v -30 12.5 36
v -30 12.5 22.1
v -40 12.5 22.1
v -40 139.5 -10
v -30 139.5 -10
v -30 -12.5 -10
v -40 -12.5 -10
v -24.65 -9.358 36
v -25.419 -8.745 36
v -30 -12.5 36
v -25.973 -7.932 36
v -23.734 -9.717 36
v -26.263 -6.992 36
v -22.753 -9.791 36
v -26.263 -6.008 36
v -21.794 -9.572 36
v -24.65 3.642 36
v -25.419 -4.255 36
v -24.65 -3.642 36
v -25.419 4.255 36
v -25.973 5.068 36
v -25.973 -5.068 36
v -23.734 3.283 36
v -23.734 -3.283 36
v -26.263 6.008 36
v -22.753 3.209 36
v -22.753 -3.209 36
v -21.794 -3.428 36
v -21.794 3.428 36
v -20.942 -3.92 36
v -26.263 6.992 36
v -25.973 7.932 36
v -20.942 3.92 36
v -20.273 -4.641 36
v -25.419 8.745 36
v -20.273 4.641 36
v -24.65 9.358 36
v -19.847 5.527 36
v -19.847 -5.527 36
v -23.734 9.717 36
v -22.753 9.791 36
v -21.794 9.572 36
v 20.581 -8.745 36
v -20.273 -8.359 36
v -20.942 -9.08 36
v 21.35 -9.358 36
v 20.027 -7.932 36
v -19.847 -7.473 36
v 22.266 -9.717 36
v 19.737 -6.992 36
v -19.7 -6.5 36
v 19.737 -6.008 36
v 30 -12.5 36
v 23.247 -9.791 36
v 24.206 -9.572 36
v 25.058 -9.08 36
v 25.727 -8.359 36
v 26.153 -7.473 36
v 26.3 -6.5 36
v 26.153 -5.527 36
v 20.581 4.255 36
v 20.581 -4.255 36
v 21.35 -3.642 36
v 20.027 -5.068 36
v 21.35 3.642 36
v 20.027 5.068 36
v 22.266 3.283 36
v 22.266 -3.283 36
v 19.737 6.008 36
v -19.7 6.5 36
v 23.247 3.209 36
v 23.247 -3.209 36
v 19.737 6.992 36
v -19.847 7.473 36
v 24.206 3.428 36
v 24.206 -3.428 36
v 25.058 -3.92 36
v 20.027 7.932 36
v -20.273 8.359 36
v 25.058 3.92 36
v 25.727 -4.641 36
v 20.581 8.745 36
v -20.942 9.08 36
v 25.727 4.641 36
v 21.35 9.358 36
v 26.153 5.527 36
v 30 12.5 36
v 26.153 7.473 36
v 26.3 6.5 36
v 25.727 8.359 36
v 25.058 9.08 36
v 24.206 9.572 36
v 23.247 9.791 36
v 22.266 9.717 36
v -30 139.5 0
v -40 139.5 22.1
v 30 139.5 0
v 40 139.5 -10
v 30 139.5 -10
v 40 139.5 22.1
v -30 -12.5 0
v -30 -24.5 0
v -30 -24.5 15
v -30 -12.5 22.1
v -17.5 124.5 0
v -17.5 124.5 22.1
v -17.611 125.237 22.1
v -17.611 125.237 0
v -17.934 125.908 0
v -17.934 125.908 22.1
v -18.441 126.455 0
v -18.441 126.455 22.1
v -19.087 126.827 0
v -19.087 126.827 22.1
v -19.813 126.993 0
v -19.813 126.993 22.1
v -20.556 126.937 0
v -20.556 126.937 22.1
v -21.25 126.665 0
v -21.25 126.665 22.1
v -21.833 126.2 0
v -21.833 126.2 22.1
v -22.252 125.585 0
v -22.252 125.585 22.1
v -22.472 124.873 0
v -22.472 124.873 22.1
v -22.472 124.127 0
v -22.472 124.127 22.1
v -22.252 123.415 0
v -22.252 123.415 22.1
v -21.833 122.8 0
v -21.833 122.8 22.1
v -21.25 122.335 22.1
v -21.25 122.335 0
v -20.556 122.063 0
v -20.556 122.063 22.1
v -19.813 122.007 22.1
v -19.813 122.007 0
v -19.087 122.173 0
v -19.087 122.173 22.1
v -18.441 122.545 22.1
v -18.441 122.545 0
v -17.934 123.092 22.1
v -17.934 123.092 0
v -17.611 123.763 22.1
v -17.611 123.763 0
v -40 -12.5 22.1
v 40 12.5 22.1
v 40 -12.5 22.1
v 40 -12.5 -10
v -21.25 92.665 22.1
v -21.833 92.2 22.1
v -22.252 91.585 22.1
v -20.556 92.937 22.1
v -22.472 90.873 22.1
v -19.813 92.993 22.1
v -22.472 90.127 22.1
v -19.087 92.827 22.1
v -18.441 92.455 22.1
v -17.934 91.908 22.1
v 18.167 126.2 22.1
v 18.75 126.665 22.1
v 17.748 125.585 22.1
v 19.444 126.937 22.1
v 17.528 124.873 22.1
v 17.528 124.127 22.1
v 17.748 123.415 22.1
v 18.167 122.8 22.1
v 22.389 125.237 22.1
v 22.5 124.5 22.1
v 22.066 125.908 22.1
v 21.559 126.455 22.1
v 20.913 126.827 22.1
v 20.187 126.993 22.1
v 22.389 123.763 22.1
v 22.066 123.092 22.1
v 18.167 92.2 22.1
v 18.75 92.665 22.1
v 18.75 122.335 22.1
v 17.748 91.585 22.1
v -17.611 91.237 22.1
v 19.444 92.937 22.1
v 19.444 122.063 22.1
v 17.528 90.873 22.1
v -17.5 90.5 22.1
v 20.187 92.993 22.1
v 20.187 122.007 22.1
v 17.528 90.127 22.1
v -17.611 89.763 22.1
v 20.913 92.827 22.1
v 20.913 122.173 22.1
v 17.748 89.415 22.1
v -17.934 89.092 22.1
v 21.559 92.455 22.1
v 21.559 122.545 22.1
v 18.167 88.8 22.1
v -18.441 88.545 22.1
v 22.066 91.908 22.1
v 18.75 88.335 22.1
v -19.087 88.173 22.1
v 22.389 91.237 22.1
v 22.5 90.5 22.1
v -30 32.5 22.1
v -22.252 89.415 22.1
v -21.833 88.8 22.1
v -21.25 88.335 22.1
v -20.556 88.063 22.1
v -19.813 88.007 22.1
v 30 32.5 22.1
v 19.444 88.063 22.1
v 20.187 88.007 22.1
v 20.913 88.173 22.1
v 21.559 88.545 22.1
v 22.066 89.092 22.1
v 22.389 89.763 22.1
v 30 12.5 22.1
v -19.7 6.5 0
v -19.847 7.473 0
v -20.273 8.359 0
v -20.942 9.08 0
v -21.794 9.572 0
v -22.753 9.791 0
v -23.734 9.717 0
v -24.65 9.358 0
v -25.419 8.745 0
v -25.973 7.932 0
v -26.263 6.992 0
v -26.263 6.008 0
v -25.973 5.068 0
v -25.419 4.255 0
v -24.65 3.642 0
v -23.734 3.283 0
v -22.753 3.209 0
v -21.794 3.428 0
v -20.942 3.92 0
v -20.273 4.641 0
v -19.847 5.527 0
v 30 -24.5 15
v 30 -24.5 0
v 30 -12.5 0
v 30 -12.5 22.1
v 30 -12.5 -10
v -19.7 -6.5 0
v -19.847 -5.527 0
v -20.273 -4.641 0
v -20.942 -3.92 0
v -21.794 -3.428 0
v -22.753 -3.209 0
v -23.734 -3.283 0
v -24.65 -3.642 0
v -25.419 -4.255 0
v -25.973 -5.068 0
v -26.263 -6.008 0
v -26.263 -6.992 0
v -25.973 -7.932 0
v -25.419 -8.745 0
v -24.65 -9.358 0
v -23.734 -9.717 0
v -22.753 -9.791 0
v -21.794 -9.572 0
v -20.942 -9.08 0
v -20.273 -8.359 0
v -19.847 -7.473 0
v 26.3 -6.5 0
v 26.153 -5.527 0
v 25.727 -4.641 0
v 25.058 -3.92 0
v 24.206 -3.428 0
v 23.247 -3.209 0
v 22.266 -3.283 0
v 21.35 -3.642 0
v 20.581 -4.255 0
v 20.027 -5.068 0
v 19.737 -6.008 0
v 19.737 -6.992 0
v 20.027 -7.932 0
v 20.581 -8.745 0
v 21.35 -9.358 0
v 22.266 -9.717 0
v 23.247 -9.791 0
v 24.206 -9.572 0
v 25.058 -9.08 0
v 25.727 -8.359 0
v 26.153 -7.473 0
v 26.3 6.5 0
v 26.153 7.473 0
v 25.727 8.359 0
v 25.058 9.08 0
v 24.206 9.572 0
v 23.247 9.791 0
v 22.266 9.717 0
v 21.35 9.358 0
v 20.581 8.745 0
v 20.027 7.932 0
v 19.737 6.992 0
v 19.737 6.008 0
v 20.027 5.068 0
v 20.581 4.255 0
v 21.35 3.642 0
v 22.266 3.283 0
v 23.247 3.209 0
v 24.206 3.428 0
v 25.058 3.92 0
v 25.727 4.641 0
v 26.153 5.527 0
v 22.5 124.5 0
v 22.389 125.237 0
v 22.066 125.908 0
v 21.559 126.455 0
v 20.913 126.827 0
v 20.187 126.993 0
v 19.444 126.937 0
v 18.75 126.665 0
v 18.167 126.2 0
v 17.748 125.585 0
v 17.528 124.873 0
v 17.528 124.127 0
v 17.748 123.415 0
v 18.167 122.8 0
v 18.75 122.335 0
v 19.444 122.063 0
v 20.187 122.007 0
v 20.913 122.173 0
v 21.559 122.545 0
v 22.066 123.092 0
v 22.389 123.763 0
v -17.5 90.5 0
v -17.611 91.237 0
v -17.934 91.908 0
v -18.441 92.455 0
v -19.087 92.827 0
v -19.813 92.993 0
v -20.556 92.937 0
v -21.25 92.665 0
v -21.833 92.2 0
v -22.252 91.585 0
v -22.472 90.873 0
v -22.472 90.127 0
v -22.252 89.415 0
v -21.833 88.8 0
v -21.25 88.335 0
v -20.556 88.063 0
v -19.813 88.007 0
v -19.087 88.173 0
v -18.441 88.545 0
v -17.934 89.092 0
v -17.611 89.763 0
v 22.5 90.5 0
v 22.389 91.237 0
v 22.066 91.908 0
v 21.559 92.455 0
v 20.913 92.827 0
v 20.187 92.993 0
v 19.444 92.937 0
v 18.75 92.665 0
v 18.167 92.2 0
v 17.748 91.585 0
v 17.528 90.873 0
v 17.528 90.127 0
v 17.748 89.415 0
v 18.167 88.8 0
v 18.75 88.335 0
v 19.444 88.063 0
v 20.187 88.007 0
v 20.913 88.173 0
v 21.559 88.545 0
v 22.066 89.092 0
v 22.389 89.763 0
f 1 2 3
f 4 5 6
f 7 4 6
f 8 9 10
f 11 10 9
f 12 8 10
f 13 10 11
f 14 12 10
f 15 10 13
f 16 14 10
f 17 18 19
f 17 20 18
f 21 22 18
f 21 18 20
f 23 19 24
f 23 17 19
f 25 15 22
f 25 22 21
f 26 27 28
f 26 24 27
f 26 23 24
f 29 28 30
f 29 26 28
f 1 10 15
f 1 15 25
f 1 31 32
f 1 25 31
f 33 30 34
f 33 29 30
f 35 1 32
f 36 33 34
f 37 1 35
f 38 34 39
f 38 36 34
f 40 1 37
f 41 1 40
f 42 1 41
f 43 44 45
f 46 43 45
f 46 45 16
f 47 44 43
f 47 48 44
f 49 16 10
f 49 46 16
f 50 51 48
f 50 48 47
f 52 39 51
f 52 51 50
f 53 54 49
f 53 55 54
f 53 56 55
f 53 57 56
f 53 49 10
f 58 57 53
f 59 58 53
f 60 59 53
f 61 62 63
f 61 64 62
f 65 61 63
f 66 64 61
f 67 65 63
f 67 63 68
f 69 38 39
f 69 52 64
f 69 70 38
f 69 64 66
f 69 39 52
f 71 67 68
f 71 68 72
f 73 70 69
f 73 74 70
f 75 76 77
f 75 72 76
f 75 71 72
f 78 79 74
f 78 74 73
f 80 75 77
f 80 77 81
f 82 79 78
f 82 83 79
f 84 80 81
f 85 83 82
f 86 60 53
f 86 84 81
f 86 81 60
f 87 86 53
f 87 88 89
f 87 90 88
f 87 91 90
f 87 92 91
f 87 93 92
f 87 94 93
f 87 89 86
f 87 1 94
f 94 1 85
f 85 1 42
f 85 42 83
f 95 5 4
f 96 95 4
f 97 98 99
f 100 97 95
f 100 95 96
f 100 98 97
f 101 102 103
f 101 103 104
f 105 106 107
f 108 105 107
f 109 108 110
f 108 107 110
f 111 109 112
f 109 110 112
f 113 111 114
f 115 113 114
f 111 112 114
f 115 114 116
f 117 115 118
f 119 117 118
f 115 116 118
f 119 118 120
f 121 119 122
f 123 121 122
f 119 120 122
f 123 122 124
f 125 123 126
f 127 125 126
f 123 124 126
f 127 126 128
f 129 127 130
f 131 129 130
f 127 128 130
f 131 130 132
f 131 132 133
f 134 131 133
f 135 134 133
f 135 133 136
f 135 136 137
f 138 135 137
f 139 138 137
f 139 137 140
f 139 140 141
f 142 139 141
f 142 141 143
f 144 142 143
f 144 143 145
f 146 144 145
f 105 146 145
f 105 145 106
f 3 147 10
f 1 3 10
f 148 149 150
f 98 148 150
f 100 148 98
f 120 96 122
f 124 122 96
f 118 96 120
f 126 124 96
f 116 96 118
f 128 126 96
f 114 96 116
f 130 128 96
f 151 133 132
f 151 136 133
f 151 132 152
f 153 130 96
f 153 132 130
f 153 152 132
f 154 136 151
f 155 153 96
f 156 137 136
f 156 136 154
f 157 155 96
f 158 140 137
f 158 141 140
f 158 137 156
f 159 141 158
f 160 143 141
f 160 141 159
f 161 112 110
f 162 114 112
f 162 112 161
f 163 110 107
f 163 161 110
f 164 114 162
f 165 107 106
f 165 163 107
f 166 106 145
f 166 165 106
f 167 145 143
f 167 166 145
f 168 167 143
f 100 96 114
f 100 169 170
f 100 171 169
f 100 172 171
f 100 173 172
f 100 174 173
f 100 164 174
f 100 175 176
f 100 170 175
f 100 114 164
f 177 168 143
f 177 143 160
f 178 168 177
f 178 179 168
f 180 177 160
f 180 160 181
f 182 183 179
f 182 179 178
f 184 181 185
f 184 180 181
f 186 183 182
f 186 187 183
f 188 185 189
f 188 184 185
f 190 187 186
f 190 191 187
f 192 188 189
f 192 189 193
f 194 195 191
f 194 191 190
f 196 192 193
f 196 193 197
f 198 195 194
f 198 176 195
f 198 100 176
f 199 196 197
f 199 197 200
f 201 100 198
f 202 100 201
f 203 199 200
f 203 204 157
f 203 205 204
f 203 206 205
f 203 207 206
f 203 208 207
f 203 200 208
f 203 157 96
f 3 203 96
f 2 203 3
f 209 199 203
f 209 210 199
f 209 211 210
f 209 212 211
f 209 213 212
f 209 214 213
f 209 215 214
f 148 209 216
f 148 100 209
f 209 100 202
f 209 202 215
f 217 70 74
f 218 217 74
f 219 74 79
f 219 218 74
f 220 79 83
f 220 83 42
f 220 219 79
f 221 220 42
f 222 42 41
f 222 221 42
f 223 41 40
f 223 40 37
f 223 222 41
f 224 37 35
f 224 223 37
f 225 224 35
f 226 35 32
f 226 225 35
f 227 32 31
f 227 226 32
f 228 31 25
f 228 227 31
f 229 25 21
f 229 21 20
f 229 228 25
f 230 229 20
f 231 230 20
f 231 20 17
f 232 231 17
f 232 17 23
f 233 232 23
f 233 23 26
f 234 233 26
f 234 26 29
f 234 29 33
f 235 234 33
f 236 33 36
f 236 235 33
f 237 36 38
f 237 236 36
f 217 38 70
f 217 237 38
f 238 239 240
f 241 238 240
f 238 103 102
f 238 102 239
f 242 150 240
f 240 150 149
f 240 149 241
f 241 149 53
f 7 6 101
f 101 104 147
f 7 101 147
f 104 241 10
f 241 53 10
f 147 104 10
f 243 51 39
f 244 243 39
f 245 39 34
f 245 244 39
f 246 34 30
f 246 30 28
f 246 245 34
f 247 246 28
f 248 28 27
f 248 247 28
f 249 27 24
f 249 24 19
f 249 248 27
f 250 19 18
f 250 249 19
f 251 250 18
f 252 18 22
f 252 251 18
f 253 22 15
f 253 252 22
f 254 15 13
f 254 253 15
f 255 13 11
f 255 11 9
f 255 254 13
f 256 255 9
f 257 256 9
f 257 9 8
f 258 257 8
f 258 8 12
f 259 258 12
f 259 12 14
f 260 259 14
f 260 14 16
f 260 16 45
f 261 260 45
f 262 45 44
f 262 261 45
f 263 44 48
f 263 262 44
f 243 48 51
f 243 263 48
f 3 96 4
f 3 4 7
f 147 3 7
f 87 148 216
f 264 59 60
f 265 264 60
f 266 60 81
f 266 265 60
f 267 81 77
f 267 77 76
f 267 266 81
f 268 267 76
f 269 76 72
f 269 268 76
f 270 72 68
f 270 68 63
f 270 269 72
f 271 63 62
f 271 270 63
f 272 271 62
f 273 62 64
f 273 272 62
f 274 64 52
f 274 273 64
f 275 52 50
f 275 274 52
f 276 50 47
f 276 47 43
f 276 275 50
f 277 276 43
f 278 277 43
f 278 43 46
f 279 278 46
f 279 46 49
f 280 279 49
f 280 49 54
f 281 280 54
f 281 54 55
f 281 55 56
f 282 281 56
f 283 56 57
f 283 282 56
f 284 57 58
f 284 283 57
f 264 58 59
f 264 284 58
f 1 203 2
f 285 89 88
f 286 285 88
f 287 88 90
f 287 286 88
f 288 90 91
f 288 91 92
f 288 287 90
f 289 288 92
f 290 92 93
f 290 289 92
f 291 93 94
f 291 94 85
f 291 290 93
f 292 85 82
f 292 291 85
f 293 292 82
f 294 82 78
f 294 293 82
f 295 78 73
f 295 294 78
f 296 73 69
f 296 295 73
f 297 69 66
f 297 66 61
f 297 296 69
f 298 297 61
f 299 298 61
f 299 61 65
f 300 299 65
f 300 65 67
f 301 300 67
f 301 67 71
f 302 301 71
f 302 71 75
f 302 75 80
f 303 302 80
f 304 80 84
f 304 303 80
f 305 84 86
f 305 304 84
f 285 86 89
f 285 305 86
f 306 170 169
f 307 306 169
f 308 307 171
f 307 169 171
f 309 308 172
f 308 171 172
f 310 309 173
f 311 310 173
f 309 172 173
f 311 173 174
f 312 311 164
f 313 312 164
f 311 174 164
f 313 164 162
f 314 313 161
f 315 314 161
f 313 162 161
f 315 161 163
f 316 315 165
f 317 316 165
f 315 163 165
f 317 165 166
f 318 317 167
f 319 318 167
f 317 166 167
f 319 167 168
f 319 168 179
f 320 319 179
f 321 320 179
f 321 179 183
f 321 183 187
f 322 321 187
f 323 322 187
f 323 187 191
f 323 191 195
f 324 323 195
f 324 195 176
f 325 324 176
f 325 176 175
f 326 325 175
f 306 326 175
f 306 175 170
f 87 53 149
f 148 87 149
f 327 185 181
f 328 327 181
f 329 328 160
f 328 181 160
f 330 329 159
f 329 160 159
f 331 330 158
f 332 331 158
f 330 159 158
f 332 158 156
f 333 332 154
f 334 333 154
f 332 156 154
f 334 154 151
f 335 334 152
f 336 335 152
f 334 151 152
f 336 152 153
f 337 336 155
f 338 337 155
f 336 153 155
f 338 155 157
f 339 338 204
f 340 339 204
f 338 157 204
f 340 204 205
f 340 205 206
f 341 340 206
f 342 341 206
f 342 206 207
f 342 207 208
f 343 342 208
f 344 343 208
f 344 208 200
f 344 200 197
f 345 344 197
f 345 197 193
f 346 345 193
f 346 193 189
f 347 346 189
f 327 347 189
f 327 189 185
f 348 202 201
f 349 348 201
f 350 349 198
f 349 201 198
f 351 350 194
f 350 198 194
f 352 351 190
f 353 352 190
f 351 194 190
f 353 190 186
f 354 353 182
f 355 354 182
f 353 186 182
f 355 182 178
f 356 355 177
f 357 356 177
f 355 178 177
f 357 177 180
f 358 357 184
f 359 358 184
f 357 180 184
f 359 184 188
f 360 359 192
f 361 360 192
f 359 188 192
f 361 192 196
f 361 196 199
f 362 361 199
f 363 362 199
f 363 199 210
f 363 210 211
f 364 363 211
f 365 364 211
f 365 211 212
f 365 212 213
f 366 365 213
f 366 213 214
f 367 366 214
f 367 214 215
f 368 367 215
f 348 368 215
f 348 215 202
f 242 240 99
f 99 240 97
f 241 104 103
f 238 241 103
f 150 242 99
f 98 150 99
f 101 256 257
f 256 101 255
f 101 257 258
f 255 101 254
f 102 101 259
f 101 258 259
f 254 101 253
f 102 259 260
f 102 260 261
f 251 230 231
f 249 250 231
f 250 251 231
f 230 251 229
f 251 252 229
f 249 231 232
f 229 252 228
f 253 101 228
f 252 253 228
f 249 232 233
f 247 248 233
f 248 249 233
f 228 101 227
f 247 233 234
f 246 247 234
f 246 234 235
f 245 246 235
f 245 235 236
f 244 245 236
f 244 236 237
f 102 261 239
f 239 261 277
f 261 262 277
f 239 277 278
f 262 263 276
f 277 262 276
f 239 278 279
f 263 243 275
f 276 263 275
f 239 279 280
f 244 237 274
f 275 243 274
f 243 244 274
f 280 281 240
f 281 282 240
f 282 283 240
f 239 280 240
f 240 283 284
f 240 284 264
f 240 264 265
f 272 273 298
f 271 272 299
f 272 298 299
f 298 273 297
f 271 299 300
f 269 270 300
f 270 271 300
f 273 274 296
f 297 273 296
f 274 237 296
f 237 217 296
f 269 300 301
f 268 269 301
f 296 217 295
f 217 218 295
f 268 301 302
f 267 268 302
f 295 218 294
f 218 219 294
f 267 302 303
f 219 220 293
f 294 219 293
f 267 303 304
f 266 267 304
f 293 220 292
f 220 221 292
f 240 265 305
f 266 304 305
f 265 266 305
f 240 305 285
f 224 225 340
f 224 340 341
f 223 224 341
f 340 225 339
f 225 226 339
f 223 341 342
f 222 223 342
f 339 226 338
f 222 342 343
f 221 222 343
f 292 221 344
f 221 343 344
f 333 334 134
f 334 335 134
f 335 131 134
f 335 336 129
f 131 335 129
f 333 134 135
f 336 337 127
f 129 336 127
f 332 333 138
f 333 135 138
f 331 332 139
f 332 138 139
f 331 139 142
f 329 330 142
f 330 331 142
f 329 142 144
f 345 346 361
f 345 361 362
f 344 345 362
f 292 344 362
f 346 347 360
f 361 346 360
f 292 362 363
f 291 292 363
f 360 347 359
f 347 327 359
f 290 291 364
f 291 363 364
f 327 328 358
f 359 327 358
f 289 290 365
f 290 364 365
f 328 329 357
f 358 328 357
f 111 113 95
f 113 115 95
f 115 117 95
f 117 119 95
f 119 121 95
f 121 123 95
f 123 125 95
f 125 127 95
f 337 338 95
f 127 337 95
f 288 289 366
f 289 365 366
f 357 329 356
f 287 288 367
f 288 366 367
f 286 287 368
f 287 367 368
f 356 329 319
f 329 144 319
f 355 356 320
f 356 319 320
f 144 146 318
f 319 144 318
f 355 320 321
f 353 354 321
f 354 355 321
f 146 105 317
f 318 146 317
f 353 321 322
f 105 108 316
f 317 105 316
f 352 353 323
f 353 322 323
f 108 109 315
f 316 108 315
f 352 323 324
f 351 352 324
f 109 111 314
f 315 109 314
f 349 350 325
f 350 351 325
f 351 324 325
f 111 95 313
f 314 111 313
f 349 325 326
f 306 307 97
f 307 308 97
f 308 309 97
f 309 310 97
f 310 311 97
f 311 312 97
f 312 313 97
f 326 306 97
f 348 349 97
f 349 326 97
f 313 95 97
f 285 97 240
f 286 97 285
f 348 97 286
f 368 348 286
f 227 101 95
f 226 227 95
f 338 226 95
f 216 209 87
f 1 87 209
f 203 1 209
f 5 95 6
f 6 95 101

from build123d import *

# Parameters (mm, degrees)
SKETCH_W     = 60
SKETCH_H     = 25
SKETCH_R     = 3.3
PAD_DEPTH    = 36
SKETCH001_W  = 60
SKETCH001_H  = 22.1
PAD001_DEPTH = 127
SKETCH002_R  = 2.5
POCKET_DEPTH = 22.101
PAD002_DEPTH = 60
SKETCH004_W  = 152
SKETCH004_H  = 32.1
PAD003_DEPTH = 10
SKETCH005_W  = 152
SKETCH005_H  = 32.1
PAD004_DEPTH = 10
PAD005_DEPTH = 25
SKETCH007_W  = 60
SKETCH007_H  = 15
PAD006_DEPTH = 12
PAD007_DEPTH = 60


with BuildPart() as part:
    # Sketch → Pad (new body)
    with BuildSketch(Plane.XY):
        Rectangle(SKETCH_W, SKETCH_H)
        with Locations((-23, 6.5)):
            Circle(SKETCH_R, mode=Mode.SUBTRACT)
        with Locations((-23, -6.5)):
            Circle(SKETCH_R, mode=Mode.SUBTRACT)
        with Locations((23, -6.5)):
            Circle(SKETCH_R, mode=Mode.SUBTRACT)
        with Locations((23, 6.5)):
            Circle(SKETCH_R, mode=Mode.SUBTRACT)
    extrude(amount=PAD_DEPTH)

    # Sketch001 (on Face1 of Pad) → Pad001 (join)
    with BuildSketch(Plane(origin=(0, 12.5, 0), x_dir=(-1, 0, 0), z_dir=(0, 1, 0))):
        with Locations((0, 11.05)):
            Rectangle(SKETCH001_W, SKETCH001_H)
    extrude(amount=PAD001_DEPTH)

    # Sketch002 (on Face2 of Pad001) → Pocket (cut, through all)
    with BuildSketch(Plane.XY.offset(22.1)):
        with Locations((-20, 124.5)):
            Circle(SKETCH002_R)
        with Locations((20, 124.5)):
            Circle(SKETCH002_R)
        with Locations((-20, 90.5)):
            Circle(SKETCH002_R)
        with Locations((20, 90.5)):
            Circle(SKETCH002_R)
    extrude(amount=-POCKET_DEPTH, mode=Mode.SUBTRACT)

    # Sketch003 (on Face6 of Pocket) → Pad002 (join)
    with BuildSketch(Plane.YZ.offset(30)):
        Polygon((12.5, 36), (32.5, 22.1), (12.5, 0), align=None)
    extrude(amount=-PAD002_DEPTH)

    # Sketch004 (on Face7 of Pad002) → Pad003 (join)
    with BuildSketch(Plane.YZ.offset(30)):
        with Locations((63.5, 6.05)):
            Rectangle(SKETCH004_W, SKETCH004_H)
    extrude(amount=PAD003_DEPTH)

    # Sketch005 (on Face20 of Pad003) → Pad004 (join)
    with BuildSketch(Plane(origin=(-30, 0, 0), x_dir=(0, -1, 0), z_dir=(-1, 0, 0))):
        with Locations((-63.5, 6.05)):
            Rectangle(SKETCH005_W, SKETCH005_H)
    extrude(amount=PAD004_DEPTH)

    # Sketch006 (on Face3 of Pad004) → Pad005 (join)
    with BuildSketch(Plane.XZ.offset(12.5)):
        Polygon((40, 22.1), (30, 22.1), (30, 36), align=None)
        Polygon((-30, 36), (-30, 22.1), (-40, 22.1), align=None)
    extrude(amount=-PAD005_DEPTH)

    # Sketch007 (on Face25 of Pad005) → Pad006 (join)
    with BuildSketch(Plane.XZ.offset(12.5)):
        with Locations((0, 7.5)):
            Rectangle(SKETCH007_W, SKETCH007_H)
    extrude(amount=PAD006_DEPTH)

    # Sketch008 (on Face40 of Pad006) → Pad007 (join)
    with BuildSketch(Plane(origin=(-30, 0, 0), x_dir=(0, -1, 0), z_dir=(-1, 0, 0))):
        Polygon((24.5, 15), (12.5, 15), (12.5, 22.1), align=None)
    extrude(amount=-PAD007_DEPTH)


solid = part.part
